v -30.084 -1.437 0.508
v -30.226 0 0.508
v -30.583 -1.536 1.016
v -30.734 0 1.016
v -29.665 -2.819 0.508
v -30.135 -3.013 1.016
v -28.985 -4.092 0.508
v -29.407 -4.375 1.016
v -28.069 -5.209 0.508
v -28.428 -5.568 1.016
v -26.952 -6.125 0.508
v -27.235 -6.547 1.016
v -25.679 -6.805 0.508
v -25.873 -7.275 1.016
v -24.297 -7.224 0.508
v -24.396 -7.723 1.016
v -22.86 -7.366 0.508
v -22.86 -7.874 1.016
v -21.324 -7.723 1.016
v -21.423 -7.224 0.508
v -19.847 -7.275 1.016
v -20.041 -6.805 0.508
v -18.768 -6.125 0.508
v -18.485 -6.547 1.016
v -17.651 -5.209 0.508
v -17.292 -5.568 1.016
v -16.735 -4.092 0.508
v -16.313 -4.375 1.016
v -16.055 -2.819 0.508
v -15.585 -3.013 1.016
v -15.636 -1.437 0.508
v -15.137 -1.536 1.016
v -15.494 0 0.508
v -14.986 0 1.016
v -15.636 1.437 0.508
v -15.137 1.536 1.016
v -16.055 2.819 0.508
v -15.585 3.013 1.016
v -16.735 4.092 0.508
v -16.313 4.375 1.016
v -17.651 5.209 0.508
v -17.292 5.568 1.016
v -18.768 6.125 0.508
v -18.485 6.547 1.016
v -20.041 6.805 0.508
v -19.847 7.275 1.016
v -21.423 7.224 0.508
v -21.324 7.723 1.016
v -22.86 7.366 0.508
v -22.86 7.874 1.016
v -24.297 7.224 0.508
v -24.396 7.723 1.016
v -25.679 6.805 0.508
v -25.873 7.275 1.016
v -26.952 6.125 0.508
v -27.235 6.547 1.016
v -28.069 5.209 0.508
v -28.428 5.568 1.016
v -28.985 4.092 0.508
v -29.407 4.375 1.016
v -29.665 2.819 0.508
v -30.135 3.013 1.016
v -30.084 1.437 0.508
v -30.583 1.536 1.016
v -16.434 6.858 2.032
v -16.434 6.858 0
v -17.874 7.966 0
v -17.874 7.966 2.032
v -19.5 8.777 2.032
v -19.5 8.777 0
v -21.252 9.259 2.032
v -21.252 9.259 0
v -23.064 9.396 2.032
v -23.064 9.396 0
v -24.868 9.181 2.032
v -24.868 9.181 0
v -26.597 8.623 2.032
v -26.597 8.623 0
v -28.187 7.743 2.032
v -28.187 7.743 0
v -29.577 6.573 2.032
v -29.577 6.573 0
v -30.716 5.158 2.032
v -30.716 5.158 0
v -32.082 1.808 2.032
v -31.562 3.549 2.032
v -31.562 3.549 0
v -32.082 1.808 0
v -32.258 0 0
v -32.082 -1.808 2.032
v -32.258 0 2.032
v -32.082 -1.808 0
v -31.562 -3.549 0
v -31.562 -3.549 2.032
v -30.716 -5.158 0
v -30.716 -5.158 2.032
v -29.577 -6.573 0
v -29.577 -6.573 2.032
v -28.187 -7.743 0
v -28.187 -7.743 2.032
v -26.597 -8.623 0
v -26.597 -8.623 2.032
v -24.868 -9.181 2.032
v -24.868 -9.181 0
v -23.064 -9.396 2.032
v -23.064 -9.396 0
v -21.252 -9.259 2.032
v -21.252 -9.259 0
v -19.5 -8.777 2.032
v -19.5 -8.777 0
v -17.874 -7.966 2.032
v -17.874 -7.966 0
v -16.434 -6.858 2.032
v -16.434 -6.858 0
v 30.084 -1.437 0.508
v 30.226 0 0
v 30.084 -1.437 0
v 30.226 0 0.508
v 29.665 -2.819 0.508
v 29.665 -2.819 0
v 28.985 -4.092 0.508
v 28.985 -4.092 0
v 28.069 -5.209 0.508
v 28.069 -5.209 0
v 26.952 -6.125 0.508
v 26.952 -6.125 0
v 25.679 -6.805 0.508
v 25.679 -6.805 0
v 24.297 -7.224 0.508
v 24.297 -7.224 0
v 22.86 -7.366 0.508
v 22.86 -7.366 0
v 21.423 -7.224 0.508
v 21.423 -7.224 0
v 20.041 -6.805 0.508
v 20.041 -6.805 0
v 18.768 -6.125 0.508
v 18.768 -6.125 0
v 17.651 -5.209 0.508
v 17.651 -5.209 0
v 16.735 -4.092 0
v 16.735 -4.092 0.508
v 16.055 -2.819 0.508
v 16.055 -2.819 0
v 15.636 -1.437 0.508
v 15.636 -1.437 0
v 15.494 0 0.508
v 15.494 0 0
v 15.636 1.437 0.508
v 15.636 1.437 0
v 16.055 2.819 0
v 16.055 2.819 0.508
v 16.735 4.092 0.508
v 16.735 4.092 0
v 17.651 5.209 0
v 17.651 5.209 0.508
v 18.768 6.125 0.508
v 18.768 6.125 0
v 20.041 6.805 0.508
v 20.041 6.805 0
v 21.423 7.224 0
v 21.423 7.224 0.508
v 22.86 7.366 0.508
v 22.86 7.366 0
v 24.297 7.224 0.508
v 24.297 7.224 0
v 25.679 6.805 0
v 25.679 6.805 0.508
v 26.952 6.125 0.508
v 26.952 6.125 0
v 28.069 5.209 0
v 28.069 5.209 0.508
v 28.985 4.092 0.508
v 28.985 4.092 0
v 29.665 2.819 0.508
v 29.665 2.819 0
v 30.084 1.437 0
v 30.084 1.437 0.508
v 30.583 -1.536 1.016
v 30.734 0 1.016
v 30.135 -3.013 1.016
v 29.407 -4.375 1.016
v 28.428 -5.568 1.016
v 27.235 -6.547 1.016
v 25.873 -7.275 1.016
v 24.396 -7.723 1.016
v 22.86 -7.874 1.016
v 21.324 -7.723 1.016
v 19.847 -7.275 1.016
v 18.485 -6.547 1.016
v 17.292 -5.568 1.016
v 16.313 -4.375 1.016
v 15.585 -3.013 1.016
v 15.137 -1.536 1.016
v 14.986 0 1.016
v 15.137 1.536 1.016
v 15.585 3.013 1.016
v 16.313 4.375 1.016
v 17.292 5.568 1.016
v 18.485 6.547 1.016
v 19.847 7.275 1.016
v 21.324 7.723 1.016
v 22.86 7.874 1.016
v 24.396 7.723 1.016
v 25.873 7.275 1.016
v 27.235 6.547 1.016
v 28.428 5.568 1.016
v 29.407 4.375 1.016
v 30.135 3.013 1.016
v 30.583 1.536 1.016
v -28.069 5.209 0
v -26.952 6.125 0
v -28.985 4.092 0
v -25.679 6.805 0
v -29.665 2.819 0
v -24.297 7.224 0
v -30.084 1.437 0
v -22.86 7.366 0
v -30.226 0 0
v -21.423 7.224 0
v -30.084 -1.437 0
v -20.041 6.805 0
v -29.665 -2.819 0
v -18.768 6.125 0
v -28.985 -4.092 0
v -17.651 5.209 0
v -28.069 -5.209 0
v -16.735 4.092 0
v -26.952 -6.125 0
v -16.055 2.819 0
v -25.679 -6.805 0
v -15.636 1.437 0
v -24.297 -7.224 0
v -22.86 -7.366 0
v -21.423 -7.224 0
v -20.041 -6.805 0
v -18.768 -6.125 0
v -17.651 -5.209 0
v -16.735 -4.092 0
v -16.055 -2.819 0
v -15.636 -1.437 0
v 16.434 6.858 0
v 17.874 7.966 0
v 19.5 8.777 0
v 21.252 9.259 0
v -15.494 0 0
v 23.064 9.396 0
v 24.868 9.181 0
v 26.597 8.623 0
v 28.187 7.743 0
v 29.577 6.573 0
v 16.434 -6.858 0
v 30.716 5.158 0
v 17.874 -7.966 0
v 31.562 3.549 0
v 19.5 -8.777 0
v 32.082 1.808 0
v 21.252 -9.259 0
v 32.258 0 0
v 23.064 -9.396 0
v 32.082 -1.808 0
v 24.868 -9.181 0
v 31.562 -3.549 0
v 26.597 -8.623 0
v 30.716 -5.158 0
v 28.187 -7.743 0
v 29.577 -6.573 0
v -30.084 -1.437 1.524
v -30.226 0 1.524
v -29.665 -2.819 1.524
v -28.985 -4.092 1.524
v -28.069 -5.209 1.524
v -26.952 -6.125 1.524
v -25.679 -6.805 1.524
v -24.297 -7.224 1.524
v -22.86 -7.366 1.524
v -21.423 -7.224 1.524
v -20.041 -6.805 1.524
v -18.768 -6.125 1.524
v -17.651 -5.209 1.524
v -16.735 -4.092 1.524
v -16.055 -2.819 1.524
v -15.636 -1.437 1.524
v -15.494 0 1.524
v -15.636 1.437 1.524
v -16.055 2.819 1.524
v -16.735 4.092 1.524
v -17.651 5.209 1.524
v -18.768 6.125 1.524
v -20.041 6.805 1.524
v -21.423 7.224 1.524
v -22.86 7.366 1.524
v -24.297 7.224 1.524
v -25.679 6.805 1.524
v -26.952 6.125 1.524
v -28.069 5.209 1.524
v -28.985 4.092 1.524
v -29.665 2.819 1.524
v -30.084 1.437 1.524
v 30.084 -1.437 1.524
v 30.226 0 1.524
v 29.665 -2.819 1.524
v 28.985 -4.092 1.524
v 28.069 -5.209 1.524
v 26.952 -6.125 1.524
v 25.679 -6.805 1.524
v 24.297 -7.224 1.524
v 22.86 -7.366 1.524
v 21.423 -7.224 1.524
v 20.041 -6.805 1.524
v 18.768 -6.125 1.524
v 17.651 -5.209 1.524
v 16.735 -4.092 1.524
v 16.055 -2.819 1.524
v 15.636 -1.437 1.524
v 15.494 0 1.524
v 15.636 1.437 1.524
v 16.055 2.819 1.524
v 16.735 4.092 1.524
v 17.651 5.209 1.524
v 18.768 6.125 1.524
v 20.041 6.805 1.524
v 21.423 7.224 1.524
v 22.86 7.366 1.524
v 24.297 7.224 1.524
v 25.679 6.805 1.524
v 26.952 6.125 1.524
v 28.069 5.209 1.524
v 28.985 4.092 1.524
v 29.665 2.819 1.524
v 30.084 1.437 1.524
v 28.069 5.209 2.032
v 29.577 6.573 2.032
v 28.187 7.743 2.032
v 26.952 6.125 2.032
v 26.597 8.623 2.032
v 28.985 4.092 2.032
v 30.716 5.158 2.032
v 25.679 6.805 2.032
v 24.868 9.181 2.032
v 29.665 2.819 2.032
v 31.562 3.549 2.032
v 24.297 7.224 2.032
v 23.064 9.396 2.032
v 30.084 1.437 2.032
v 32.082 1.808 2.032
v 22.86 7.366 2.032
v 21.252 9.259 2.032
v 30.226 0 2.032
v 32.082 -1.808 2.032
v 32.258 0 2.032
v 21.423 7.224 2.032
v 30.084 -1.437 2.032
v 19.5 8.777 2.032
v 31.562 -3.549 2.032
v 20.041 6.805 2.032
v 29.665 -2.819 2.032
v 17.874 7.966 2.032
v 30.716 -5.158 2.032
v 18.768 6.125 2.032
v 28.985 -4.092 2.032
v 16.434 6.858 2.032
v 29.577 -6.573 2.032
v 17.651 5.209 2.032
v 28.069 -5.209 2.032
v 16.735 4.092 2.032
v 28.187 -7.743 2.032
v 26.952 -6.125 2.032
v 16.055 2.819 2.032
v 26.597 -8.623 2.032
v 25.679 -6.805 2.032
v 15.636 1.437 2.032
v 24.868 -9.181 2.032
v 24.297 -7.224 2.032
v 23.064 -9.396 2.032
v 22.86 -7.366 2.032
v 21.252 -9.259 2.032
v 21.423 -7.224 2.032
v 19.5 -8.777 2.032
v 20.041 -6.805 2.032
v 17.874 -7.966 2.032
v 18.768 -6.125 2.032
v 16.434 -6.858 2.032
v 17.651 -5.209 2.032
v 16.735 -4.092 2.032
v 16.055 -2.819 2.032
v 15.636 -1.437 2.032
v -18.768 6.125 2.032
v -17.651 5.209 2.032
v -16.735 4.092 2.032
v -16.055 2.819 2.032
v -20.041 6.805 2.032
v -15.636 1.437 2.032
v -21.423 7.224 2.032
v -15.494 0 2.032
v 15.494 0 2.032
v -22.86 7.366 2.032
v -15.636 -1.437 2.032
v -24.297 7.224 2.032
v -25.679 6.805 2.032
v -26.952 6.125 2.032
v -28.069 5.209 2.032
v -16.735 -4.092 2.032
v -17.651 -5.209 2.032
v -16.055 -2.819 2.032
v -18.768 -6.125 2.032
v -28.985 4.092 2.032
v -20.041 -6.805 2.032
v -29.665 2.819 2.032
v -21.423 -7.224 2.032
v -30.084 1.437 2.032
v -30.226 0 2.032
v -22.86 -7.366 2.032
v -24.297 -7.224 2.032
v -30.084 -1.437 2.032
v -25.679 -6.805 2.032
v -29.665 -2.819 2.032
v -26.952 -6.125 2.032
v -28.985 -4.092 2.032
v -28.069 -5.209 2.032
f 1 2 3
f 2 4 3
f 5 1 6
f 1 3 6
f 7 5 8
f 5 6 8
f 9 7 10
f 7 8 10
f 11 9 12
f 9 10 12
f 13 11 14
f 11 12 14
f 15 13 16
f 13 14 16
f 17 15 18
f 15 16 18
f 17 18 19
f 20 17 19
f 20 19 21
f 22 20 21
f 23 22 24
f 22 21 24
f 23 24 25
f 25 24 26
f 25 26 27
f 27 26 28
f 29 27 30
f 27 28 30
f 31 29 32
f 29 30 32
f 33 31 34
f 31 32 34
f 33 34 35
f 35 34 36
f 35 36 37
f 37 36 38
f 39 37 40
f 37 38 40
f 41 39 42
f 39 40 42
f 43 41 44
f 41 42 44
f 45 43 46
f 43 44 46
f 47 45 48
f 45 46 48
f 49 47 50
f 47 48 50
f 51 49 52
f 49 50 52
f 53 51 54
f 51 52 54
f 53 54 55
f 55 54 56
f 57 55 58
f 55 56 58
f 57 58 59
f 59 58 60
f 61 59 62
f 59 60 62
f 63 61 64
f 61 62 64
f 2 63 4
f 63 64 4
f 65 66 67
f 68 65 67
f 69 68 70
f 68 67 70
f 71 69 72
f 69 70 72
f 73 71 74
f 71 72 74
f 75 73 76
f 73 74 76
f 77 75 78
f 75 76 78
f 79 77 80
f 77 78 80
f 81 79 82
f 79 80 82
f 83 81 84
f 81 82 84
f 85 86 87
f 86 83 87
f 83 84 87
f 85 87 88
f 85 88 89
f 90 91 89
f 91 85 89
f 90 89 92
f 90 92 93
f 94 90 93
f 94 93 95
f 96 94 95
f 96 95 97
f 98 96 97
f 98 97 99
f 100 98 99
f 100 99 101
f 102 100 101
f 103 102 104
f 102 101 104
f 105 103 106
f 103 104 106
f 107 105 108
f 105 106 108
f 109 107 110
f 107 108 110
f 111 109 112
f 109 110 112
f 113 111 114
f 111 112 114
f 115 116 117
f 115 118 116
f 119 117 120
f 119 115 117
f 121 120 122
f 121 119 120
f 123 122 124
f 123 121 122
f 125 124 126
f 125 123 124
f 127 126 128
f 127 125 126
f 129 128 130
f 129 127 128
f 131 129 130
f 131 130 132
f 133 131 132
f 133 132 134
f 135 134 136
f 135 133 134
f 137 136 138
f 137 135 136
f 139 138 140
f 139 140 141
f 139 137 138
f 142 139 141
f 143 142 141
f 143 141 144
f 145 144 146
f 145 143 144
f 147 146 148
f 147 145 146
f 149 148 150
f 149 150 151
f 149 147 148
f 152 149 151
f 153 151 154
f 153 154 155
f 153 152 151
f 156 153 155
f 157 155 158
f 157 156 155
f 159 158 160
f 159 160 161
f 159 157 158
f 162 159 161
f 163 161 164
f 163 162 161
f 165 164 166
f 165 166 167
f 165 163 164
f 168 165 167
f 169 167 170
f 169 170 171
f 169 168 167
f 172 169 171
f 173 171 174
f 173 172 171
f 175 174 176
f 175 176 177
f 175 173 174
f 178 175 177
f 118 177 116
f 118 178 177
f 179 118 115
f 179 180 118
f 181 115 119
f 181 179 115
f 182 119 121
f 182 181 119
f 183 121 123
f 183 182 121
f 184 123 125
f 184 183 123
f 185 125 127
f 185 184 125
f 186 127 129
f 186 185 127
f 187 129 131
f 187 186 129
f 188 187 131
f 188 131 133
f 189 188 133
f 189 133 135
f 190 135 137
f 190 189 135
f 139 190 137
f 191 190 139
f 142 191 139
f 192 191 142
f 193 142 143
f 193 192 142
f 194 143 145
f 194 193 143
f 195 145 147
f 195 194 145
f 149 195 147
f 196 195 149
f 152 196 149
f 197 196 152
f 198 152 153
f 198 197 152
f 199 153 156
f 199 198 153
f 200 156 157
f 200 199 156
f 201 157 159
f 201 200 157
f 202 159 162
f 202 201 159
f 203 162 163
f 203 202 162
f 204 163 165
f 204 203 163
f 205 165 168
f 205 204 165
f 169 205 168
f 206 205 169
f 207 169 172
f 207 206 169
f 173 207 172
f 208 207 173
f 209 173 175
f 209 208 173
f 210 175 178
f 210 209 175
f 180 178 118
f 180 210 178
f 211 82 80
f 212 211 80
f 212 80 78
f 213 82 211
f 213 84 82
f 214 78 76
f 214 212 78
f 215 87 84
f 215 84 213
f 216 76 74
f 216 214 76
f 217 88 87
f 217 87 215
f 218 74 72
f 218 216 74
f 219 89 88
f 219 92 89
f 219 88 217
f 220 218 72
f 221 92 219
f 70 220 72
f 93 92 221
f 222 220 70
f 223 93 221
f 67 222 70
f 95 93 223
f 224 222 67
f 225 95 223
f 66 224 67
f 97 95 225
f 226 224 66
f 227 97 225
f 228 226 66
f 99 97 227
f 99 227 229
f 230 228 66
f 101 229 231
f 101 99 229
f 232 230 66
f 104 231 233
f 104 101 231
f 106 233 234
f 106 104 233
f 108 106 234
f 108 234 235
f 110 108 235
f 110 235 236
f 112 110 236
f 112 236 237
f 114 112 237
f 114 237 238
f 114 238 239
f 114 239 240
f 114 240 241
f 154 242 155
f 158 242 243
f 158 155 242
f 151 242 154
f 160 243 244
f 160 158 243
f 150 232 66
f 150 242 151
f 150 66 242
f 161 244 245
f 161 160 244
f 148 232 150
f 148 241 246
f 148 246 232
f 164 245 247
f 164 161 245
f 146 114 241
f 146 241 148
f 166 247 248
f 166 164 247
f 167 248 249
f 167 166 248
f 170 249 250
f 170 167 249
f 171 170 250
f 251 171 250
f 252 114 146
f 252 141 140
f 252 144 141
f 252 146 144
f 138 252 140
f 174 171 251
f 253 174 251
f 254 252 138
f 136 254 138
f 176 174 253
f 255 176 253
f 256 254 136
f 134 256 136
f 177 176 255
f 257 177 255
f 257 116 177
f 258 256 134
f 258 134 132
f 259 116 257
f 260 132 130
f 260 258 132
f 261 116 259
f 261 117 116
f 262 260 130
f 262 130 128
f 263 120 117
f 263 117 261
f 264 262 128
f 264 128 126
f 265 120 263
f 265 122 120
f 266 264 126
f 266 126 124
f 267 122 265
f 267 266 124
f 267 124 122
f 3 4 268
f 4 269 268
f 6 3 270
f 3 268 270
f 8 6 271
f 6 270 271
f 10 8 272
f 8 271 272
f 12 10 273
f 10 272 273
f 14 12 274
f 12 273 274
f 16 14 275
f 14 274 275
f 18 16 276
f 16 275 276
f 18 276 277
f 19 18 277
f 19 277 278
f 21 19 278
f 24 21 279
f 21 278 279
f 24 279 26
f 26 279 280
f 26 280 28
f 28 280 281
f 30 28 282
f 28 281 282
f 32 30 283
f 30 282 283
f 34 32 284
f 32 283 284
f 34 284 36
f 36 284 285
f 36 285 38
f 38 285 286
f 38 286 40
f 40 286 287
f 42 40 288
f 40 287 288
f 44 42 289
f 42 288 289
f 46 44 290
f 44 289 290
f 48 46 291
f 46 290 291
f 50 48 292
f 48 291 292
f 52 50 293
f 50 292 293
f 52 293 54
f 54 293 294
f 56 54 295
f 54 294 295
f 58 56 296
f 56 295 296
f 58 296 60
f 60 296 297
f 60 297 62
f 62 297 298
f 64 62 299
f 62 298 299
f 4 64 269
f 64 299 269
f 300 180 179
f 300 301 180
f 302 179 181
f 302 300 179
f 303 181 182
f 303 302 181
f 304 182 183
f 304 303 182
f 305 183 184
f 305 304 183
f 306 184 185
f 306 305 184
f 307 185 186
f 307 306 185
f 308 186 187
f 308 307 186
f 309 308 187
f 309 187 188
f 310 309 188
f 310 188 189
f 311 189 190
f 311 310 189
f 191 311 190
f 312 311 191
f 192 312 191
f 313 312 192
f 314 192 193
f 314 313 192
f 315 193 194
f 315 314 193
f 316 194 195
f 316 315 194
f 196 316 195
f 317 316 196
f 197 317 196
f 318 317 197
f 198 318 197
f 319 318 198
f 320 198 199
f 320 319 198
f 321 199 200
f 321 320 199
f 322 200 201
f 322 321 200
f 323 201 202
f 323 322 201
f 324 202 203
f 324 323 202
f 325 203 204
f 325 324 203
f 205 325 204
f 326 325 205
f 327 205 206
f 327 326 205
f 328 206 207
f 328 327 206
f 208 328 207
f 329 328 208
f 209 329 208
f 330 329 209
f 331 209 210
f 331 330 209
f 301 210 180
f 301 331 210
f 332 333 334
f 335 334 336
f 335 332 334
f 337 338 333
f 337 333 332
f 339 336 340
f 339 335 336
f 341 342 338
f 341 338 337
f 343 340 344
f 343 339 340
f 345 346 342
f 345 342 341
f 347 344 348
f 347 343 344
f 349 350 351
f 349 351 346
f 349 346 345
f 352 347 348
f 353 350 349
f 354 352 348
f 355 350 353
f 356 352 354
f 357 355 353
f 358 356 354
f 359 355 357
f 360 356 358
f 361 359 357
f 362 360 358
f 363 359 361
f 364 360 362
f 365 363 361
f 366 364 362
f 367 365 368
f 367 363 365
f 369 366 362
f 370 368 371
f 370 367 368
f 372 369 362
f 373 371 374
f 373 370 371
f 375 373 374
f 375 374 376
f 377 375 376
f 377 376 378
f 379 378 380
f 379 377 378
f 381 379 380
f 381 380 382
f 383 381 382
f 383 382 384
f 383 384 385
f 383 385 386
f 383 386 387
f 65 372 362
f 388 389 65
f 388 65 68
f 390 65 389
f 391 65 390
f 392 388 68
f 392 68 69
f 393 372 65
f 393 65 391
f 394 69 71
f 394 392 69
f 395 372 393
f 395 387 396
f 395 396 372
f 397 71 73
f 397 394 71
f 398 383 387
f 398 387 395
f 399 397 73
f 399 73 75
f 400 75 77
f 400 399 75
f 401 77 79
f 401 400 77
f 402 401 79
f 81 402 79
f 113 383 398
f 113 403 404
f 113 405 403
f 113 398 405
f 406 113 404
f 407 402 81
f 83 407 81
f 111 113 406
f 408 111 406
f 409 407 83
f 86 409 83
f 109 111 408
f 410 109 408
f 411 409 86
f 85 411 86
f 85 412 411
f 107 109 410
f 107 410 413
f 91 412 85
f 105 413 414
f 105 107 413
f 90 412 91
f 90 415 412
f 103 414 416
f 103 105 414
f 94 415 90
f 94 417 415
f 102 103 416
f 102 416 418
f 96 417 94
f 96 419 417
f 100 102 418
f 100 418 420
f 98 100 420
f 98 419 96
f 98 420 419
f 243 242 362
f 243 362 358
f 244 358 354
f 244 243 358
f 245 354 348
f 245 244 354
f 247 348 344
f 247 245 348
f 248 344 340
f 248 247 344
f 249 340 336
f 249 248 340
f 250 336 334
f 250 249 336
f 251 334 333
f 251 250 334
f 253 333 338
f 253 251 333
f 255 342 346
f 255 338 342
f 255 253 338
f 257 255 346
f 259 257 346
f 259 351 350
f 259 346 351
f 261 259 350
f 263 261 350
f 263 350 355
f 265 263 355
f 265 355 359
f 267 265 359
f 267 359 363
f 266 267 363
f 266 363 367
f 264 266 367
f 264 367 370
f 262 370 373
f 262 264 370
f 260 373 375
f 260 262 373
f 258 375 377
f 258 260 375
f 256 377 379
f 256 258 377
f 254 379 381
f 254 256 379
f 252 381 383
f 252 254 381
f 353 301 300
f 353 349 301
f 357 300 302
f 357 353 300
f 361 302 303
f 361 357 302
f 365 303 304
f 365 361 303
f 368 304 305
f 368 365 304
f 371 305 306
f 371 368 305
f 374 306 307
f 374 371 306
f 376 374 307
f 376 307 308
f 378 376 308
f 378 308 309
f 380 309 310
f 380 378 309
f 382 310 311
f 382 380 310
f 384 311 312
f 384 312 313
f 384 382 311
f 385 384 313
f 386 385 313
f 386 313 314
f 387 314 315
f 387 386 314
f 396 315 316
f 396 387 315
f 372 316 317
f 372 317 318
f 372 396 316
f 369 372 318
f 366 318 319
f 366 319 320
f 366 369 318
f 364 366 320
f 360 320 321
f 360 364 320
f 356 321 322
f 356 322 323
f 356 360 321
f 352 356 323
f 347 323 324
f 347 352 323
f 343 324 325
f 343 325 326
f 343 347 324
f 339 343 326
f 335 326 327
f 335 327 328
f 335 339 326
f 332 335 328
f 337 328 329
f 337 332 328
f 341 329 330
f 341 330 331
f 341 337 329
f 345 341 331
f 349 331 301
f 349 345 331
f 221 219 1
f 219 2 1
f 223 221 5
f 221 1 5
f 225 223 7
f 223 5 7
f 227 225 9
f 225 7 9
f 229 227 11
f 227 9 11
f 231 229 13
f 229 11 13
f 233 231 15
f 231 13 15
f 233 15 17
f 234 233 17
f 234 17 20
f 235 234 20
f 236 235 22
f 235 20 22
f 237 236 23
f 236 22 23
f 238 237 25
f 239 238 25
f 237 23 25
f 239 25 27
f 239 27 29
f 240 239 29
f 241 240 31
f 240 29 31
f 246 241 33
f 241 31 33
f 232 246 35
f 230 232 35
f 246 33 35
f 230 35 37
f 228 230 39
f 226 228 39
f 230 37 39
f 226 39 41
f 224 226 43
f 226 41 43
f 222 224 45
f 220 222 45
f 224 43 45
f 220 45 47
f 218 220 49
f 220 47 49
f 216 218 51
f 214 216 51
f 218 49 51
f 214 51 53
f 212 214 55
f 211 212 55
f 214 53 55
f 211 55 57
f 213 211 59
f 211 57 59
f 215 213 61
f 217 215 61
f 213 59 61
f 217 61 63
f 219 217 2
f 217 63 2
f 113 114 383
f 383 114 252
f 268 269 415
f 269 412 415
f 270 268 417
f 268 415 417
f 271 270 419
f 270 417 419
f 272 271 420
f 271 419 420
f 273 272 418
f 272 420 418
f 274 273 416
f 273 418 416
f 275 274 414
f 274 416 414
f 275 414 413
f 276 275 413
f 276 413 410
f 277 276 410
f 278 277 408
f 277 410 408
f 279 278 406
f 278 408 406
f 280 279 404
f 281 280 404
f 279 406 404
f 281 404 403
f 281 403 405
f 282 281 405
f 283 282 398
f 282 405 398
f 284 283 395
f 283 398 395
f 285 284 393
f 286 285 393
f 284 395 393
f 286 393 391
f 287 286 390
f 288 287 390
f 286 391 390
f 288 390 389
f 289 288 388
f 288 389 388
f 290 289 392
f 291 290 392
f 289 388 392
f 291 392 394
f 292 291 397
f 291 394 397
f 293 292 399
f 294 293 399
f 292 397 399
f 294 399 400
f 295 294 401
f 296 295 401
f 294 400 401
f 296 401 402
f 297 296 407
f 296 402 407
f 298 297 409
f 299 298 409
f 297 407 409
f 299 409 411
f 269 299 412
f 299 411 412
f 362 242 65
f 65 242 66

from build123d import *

# Parameters (mm, degrees)
F1_DEPTH = 2.032


with BuildPart() as f1:
    # F0 (on Top) → F1 (new body)
    with BuildSketch(Plane.XY):
        with BuildLine():
            ThreePointArc((-18.497407, 6.858), (-15.73527, 3.911855), (-14.732, 0))
            ThreePointArc((-14.732, 0), (-15.73527, -3.911855), (-18.497407, -6.858))
            Line((-18.497407, -6.858), (18.497407, -6.858))
            ThreePointArc((18.497407, -6.858), (14.732, 0), (18.497407, 6.858))
            Line((18.497407, 6.858), (-18.497407, 6.858))
        make_face()
    extrude(amount=F1_DEPTH)

    # F2 (on Front) → F3 (revolve)
    with BuildSketch(Plane.XZ):
        Polygon((-32.258, 2.032), (-32.258, 0), (-30.226, 0), (-30.226, 0.508), (-30.734, 1.016), (-30.226, 1.524), (-30.226, 2.032), align=None)
    revolve(axis=Axis((-22.86, 0, 0.9144), (0, 0, 1)))

    # F4: F1 across plane


with BuildPart() as f1_1:
    add(f1.part)
    add(f1.part.mirror(Plane.YZ))


solid = f1_1.part
